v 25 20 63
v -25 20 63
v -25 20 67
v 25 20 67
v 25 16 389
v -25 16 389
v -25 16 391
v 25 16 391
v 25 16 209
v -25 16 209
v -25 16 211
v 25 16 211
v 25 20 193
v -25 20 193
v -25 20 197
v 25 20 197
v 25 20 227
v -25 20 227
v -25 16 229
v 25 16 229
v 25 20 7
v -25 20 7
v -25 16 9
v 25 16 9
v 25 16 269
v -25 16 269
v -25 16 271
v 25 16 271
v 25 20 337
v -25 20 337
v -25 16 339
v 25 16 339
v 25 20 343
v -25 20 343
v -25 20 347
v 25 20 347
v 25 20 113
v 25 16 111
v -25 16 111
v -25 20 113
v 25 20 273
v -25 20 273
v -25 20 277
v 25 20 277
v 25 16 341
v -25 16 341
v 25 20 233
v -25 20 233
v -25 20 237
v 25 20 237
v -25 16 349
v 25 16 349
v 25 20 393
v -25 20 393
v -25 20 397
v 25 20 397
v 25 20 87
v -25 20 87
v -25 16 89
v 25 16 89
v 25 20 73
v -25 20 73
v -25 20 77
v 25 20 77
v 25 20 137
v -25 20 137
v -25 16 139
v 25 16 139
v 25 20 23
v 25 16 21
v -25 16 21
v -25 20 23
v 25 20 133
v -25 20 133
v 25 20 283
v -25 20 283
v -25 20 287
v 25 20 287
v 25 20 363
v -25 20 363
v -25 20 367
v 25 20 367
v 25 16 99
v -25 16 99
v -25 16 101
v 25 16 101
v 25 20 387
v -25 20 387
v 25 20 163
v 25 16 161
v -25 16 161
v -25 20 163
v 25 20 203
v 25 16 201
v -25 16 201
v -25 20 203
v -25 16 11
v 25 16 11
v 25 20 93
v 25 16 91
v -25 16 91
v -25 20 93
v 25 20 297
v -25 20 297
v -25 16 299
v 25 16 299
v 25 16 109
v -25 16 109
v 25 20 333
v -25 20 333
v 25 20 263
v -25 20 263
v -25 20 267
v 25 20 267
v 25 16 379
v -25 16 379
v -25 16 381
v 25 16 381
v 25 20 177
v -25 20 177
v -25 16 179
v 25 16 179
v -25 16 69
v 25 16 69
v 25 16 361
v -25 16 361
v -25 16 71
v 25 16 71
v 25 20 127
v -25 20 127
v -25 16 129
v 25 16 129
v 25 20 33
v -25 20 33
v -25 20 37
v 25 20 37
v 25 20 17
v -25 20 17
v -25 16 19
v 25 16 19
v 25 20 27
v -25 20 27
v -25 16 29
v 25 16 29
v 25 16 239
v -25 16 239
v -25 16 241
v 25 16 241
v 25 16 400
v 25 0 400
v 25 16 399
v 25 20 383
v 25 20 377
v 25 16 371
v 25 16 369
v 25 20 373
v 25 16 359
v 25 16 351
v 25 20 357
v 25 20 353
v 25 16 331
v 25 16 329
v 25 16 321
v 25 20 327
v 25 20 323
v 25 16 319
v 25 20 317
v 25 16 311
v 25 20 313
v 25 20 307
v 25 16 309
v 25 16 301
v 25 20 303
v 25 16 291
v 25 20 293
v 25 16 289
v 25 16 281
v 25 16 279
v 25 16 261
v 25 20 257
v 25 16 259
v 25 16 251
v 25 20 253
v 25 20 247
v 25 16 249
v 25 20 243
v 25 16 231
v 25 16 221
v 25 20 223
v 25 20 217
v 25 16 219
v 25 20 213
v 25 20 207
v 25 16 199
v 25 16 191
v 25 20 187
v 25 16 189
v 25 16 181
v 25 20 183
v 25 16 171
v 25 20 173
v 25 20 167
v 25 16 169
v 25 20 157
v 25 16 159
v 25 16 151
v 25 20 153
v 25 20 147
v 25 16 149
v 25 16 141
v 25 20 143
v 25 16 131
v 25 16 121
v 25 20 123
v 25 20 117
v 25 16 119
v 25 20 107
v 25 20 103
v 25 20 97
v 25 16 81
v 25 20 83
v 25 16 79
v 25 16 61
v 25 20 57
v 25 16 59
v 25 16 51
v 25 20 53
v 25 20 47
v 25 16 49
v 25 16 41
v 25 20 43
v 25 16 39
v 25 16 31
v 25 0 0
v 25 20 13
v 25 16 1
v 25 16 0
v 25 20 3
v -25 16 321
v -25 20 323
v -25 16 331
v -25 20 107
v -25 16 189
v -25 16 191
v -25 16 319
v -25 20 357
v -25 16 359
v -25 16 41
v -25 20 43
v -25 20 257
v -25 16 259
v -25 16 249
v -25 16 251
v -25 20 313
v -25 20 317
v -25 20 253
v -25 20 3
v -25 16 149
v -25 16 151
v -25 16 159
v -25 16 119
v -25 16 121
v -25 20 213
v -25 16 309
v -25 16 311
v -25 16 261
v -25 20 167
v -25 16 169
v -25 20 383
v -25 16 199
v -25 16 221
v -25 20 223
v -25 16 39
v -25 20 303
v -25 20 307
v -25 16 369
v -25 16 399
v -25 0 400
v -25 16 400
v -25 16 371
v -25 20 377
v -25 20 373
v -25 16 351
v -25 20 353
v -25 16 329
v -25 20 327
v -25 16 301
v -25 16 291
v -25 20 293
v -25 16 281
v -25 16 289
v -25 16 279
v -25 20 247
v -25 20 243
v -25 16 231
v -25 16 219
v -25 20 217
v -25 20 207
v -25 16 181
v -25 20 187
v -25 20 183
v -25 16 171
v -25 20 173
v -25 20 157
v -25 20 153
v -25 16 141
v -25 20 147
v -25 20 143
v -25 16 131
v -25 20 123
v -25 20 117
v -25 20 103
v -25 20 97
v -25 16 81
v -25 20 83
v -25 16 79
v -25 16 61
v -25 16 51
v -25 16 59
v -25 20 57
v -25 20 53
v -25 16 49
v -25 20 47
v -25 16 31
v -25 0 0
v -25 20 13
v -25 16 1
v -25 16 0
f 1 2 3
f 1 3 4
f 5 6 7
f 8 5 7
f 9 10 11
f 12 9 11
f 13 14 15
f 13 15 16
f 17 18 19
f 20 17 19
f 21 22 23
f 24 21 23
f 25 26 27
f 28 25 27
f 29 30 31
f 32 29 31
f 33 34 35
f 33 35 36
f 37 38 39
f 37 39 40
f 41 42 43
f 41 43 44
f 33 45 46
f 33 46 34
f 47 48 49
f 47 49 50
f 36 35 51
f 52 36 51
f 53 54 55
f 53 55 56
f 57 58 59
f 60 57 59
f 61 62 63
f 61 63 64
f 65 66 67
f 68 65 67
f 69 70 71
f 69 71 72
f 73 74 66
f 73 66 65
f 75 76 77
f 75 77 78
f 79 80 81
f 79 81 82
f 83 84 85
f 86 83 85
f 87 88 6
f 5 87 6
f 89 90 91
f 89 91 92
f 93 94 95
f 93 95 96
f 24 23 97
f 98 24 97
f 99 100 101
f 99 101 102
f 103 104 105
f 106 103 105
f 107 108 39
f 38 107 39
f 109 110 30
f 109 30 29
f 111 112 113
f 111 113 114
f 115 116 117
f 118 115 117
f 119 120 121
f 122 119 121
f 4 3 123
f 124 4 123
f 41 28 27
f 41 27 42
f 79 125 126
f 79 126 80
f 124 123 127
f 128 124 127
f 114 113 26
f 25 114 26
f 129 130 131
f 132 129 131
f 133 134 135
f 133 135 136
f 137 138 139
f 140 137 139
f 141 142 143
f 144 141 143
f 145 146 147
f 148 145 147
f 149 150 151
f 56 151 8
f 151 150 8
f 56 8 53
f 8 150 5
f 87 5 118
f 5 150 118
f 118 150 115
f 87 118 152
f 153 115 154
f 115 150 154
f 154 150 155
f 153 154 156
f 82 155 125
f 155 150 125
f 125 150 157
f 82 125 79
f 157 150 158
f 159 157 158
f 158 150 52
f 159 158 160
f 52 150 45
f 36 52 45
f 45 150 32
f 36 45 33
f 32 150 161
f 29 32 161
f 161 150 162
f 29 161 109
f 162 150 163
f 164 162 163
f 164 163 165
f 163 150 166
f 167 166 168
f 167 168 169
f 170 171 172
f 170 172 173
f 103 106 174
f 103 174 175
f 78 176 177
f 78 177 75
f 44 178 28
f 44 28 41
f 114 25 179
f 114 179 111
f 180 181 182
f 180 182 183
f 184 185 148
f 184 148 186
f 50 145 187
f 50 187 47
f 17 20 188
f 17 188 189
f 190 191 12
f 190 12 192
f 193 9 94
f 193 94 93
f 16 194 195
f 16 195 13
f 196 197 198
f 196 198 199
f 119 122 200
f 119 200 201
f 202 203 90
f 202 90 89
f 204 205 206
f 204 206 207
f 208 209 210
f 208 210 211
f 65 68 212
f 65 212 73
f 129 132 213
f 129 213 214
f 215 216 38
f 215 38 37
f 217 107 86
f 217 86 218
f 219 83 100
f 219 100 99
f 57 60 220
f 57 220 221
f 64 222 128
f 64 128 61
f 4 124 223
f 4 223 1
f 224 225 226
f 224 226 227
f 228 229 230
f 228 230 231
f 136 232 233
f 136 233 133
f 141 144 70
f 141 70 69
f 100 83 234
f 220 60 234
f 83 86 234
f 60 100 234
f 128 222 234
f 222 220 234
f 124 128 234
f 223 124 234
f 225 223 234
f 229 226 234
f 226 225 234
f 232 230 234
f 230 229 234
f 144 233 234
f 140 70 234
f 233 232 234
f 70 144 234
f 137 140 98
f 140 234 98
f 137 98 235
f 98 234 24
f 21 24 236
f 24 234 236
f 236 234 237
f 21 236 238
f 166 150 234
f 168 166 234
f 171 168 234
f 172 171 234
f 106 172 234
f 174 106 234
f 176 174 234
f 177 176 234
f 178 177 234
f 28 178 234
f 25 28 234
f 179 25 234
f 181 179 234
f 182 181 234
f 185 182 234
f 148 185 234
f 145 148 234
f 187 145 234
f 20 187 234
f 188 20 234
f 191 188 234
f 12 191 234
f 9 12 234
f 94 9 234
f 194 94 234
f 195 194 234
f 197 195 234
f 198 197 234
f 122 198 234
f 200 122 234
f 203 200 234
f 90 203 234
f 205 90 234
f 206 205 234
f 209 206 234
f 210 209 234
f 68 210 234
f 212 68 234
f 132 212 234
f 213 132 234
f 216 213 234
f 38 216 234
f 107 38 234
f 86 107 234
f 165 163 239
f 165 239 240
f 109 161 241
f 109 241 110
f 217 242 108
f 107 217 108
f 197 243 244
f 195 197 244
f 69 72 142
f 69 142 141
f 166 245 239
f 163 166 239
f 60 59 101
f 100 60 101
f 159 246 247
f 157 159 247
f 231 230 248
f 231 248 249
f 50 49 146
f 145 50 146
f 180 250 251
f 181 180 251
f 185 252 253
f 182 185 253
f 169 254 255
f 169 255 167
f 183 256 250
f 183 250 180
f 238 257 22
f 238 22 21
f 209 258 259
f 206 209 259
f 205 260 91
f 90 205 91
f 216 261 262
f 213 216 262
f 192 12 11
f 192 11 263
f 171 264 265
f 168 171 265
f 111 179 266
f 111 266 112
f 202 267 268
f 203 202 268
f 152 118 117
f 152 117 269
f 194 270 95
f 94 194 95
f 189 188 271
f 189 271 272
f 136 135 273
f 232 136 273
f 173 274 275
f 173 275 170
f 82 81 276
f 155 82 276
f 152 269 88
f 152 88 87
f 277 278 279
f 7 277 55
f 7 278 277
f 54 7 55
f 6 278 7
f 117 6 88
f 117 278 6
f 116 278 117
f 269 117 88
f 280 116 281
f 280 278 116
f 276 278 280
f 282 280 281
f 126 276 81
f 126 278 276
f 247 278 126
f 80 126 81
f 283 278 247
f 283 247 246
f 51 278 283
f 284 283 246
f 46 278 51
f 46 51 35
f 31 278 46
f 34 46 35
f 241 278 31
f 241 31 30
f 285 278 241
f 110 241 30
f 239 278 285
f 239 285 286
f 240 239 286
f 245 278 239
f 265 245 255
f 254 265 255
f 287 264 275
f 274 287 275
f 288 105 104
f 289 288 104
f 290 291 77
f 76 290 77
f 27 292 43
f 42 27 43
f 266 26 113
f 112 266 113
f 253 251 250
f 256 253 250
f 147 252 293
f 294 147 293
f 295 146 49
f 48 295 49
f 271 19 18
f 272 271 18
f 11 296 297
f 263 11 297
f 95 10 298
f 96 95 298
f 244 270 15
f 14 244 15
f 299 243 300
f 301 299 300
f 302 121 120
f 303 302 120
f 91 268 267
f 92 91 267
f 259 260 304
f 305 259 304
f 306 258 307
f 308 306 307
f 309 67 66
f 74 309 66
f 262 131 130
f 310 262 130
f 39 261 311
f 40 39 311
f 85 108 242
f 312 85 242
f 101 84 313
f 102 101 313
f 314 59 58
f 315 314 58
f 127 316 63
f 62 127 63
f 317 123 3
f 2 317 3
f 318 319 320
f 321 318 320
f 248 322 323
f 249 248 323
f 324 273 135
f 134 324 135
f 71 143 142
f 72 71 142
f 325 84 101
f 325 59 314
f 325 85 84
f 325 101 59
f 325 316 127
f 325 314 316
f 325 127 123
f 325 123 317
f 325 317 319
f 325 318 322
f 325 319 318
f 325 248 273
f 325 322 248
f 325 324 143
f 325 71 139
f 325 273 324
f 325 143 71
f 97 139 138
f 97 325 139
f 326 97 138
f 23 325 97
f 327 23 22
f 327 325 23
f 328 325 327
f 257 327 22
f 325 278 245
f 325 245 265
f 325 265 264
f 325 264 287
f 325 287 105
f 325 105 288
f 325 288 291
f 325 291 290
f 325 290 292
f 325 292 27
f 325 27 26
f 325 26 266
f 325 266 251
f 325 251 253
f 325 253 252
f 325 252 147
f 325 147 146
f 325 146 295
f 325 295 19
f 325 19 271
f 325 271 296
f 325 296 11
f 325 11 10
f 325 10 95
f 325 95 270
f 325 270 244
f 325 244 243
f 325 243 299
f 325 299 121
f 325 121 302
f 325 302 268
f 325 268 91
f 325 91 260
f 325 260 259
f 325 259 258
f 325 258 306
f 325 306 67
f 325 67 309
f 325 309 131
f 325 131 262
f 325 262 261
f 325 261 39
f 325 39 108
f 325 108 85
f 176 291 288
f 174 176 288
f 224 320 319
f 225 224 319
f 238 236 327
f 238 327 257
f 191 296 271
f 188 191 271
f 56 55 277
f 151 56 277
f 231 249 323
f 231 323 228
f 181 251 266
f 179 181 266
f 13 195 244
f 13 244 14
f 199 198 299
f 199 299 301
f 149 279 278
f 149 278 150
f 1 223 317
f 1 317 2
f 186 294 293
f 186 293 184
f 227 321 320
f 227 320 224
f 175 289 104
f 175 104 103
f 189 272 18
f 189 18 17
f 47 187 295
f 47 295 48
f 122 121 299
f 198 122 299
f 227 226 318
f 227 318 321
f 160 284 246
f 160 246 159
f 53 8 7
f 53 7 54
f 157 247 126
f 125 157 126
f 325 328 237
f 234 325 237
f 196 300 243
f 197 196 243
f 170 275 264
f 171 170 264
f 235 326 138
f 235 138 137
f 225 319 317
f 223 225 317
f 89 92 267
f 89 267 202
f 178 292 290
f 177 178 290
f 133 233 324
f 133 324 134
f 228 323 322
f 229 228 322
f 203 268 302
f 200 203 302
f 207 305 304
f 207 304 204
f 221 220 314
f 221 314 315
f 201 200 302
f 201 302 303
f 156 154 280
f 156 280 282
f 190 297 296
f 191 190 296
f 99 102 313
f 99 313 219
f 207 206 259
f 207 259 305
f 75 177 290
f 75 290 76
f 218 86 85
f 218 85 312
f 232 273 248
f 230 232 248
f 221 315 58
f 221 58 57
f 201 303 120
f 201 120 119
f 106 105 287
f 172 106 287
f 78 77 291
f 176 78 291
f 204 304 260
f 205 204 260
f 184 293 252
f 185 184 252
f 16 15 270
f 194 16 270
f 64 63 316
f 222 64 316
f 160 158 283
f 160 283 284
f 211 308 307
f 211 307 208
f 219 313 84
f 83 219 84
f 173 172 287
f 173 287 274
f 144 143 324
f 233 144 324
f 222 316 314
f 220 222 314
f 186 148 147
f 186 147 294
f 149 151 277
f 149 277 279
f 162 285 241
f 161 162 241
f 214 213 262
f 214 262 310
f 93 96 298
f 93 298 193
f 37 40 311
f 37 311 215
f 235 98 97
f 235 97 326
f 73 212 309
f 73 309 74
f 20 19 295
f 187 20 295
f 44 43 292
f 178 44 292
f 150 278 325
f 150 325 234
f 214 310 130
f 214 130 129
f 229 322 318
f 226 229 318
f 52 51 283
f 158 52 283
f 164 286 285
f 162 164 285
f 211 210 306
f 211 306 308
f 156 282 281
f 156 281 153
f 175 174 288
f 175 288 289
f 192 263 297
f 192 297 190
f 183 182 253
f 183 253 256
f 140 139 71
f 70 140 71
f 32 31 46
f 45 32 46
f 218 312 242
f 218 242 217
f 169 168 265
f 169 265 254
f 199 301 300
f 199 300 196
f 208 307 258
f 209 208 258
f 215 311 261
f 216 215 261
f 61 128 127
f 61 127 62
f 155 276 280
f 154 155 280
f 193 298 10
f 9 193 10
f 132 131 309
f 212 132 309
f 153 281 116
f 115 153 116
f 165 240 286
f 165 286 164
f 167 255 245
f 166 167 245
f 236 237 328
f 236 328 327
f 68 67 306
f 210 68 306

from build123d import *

# Parameters (mm, degrees)
SKETCH1_W           = 50
SKETCH1_H           = 20
BOSS_EXTRUDE1_DEPTH = 400
CUT_EXTRUDE1_START  = -50
CUT_EXTRUDE1_DEPTH  = 50
LPATTERN1_COUNT     = 41
LPATTERN1_PITCH     = 10


with BuildPart() as part:
    # Sketch1 → Boss-Extrude1 (new body)
    with BuildSketch(Plane.XY):
        with Locations((0, 10)):
            Rectangle(SKETCH1_W, SKETCH1_H)
    extrude(amount=BOSS_EXTRUDE1_DEPTH)

    # Sketch2 → Cut-Extrude1 (cut)
    with BuildSketch(Plane(origin=(25, 0, 0), x_dir=(0, 0, -1), z_dir=(1, 0, 0)).offset(CUT_EXTRUDE1_START)):
        Polygon((-403, 20), (-397, 20), (-399, 16), (-401, 16), align=None)
    cut_extrude1 = extrude(amount=CUT_EXTRUDE1_DEPTH, mode=Mode.SUBTRACT)

    # LPattern1: Cut-Extrude1 ×41
    with Locations(*[(0, 0, -i * LPATTERN1_PITCH) for i in range(1, LPATTERN1_COUNT)]):
        add(cut_extrude1, mode=Mode.SUBTRACT)


solid = part.part
